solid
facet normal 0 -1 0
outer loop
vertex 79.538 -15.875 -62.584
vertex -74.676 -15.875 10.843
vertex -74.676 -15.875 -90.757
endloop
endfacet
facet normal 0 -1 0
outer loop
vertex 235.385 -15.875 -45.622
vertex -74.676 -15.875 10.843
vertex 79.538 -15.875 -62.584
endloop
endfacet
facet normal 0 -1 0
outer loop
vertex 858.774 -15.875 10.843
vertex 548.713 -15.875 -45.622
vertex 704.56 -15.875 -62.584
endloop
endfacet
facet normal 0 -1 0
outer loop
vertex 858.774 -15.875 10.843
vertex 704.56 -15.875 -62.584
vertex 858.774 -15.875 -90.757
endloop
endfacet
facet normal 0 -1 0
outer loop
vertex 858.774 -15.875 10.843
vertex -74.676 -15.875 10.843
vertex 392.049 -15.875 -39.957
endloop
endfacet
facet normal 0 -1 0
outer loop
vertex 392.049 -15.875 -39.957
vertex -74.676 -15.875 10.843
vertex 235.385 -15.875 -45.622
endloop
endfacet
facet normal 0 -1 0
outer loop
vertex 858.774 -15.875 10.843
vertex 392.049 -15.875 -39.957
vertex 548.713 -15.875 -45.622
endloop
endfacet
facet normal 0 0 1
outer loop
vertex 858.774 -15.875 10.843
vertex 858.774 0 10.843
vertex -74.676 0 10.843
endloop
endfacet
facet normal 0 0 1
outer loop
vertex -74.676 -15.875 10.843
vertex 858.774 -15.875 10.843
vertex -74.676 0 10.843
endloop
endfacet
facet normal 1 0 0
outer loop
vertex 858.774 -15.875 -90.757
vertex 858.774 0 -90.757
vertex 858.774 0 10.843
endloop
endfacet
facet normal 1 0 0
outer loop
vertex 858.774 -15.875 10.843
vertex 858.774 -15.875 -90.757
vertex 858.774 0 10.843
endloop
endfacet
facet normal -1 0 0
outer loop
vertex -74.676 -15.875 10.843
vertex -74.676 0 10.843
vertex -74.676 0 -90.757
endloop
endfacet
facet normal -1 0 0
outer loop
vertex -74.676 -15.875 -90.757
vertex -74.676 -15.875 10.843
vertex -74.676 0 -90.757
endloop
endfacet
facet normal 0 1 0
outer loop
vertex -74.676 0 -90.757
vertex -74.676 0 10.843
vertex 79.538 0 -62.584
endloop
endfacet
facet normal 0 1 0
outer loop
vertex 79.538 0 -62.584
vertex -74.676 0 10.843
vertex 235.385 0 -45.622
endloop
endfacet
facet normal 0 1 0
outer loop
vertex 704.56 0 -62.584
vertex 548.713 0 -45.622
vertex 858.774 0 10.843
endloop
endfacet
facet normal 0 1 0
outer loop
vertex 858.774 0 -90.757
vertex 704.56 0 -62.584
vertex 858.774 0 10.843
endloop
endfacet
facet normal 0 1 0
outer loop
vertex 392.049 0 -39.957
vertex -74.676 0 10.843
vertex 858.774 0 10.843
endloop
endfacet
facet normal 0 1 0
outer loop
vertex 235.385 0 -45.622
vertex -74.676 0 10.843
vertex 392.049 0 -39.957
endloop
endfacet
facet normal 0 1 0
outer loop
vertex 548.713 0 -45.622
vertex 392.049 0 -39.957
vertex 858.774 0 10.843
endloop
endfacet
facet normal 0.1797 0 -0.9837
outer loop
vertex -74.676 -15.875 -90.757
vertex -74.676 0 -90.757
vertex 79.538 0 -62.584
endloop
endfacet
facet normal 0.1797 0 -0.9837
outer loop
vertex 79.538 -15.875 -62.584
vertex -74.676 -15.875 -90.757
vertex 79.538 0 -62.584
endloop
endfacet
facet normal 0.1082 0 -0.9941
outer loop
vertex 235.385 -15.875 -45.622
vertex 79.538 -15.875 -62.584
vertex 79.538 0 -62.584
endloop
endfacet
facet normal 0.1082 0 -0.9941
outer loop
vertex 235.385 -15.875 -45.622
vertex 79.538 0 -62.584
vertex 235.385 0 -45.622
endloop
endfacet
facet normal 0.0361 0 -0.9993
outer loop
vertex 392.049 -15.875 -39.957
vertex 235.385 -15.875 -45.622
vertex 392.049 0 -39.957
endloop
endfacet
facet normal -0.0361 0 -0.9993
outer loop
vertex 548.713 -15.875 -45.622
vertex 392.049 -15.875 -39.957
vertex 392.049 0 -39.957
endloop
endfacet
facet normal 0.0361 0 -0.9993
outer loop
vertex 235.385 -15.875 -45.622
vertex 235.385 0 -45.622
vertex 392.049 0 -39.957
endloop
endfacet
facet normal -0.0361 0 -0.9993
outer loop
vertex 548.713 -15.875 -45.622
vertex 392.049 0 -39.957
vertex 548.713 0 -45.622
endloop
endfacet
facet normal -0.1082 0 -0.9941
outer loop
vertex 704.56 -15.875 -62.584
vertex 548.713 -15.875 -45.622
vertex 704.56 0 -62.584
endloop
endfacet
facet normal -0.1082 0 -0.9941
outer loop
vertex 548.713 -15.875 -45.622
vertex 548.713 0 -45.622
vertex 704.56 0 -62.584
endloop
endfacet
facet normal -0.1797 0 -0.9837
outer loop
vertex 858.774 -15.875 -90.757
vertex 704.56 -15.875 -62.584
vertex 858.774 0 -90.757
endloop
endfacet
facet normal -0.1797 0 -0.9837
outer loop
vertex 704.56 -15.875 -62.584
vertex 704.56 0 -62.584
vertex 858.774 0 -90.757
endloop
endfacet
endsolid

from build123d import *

# Parameters (mm, degrees)
F1_DEPTH = 25.4
F4_DEPTH = 15.875


with BuildPart() as f1:
    # F0 (on Front) → F1 (new body)
    with BuildSketch(Plane.XZ):
        with BuildLine():
            Line((862.5024050593, 9.3825748086), (-70.9475949407, 9.3825748086))
            Line((-70.9475949407, 9.3825748086), (-70.9475949407, -66.8174251914))
            ThreePointArc((-70.9475949407, -66.8174251914), (395.7774050593, -16.0174251914), (862.5024050593, -66.8174251914))
            Line((862.5024050593, -66.8174251914), (862.5024050593, 9.3825748086))
        make_face()
    extrude(amount=F1_DEPTH)


with BuildPart() as f4:
    # F3 (on Front) → F4 (new body)
    with BuildSketch(Plane.XZ):
        with BuildLine():
            Line((858.7739929676, 10.8425256968), (-74.6760070324, 10.8425256968))
            Line((-74.6760070324, 10.8425256968), (-74.6760070324, -90.7574743032))
            ThreePointArc((-74.6760070324, -90.7574743032), (392.0489929676, -39.9574743032), (858.7739929676, -90.7574743032))
            Line((858.7739929676, -90.7574743032), (858.7739929676, 10.8425256968))
        make_face()
    extrude(amount=F4_DEPTH)


solid = f4.part
